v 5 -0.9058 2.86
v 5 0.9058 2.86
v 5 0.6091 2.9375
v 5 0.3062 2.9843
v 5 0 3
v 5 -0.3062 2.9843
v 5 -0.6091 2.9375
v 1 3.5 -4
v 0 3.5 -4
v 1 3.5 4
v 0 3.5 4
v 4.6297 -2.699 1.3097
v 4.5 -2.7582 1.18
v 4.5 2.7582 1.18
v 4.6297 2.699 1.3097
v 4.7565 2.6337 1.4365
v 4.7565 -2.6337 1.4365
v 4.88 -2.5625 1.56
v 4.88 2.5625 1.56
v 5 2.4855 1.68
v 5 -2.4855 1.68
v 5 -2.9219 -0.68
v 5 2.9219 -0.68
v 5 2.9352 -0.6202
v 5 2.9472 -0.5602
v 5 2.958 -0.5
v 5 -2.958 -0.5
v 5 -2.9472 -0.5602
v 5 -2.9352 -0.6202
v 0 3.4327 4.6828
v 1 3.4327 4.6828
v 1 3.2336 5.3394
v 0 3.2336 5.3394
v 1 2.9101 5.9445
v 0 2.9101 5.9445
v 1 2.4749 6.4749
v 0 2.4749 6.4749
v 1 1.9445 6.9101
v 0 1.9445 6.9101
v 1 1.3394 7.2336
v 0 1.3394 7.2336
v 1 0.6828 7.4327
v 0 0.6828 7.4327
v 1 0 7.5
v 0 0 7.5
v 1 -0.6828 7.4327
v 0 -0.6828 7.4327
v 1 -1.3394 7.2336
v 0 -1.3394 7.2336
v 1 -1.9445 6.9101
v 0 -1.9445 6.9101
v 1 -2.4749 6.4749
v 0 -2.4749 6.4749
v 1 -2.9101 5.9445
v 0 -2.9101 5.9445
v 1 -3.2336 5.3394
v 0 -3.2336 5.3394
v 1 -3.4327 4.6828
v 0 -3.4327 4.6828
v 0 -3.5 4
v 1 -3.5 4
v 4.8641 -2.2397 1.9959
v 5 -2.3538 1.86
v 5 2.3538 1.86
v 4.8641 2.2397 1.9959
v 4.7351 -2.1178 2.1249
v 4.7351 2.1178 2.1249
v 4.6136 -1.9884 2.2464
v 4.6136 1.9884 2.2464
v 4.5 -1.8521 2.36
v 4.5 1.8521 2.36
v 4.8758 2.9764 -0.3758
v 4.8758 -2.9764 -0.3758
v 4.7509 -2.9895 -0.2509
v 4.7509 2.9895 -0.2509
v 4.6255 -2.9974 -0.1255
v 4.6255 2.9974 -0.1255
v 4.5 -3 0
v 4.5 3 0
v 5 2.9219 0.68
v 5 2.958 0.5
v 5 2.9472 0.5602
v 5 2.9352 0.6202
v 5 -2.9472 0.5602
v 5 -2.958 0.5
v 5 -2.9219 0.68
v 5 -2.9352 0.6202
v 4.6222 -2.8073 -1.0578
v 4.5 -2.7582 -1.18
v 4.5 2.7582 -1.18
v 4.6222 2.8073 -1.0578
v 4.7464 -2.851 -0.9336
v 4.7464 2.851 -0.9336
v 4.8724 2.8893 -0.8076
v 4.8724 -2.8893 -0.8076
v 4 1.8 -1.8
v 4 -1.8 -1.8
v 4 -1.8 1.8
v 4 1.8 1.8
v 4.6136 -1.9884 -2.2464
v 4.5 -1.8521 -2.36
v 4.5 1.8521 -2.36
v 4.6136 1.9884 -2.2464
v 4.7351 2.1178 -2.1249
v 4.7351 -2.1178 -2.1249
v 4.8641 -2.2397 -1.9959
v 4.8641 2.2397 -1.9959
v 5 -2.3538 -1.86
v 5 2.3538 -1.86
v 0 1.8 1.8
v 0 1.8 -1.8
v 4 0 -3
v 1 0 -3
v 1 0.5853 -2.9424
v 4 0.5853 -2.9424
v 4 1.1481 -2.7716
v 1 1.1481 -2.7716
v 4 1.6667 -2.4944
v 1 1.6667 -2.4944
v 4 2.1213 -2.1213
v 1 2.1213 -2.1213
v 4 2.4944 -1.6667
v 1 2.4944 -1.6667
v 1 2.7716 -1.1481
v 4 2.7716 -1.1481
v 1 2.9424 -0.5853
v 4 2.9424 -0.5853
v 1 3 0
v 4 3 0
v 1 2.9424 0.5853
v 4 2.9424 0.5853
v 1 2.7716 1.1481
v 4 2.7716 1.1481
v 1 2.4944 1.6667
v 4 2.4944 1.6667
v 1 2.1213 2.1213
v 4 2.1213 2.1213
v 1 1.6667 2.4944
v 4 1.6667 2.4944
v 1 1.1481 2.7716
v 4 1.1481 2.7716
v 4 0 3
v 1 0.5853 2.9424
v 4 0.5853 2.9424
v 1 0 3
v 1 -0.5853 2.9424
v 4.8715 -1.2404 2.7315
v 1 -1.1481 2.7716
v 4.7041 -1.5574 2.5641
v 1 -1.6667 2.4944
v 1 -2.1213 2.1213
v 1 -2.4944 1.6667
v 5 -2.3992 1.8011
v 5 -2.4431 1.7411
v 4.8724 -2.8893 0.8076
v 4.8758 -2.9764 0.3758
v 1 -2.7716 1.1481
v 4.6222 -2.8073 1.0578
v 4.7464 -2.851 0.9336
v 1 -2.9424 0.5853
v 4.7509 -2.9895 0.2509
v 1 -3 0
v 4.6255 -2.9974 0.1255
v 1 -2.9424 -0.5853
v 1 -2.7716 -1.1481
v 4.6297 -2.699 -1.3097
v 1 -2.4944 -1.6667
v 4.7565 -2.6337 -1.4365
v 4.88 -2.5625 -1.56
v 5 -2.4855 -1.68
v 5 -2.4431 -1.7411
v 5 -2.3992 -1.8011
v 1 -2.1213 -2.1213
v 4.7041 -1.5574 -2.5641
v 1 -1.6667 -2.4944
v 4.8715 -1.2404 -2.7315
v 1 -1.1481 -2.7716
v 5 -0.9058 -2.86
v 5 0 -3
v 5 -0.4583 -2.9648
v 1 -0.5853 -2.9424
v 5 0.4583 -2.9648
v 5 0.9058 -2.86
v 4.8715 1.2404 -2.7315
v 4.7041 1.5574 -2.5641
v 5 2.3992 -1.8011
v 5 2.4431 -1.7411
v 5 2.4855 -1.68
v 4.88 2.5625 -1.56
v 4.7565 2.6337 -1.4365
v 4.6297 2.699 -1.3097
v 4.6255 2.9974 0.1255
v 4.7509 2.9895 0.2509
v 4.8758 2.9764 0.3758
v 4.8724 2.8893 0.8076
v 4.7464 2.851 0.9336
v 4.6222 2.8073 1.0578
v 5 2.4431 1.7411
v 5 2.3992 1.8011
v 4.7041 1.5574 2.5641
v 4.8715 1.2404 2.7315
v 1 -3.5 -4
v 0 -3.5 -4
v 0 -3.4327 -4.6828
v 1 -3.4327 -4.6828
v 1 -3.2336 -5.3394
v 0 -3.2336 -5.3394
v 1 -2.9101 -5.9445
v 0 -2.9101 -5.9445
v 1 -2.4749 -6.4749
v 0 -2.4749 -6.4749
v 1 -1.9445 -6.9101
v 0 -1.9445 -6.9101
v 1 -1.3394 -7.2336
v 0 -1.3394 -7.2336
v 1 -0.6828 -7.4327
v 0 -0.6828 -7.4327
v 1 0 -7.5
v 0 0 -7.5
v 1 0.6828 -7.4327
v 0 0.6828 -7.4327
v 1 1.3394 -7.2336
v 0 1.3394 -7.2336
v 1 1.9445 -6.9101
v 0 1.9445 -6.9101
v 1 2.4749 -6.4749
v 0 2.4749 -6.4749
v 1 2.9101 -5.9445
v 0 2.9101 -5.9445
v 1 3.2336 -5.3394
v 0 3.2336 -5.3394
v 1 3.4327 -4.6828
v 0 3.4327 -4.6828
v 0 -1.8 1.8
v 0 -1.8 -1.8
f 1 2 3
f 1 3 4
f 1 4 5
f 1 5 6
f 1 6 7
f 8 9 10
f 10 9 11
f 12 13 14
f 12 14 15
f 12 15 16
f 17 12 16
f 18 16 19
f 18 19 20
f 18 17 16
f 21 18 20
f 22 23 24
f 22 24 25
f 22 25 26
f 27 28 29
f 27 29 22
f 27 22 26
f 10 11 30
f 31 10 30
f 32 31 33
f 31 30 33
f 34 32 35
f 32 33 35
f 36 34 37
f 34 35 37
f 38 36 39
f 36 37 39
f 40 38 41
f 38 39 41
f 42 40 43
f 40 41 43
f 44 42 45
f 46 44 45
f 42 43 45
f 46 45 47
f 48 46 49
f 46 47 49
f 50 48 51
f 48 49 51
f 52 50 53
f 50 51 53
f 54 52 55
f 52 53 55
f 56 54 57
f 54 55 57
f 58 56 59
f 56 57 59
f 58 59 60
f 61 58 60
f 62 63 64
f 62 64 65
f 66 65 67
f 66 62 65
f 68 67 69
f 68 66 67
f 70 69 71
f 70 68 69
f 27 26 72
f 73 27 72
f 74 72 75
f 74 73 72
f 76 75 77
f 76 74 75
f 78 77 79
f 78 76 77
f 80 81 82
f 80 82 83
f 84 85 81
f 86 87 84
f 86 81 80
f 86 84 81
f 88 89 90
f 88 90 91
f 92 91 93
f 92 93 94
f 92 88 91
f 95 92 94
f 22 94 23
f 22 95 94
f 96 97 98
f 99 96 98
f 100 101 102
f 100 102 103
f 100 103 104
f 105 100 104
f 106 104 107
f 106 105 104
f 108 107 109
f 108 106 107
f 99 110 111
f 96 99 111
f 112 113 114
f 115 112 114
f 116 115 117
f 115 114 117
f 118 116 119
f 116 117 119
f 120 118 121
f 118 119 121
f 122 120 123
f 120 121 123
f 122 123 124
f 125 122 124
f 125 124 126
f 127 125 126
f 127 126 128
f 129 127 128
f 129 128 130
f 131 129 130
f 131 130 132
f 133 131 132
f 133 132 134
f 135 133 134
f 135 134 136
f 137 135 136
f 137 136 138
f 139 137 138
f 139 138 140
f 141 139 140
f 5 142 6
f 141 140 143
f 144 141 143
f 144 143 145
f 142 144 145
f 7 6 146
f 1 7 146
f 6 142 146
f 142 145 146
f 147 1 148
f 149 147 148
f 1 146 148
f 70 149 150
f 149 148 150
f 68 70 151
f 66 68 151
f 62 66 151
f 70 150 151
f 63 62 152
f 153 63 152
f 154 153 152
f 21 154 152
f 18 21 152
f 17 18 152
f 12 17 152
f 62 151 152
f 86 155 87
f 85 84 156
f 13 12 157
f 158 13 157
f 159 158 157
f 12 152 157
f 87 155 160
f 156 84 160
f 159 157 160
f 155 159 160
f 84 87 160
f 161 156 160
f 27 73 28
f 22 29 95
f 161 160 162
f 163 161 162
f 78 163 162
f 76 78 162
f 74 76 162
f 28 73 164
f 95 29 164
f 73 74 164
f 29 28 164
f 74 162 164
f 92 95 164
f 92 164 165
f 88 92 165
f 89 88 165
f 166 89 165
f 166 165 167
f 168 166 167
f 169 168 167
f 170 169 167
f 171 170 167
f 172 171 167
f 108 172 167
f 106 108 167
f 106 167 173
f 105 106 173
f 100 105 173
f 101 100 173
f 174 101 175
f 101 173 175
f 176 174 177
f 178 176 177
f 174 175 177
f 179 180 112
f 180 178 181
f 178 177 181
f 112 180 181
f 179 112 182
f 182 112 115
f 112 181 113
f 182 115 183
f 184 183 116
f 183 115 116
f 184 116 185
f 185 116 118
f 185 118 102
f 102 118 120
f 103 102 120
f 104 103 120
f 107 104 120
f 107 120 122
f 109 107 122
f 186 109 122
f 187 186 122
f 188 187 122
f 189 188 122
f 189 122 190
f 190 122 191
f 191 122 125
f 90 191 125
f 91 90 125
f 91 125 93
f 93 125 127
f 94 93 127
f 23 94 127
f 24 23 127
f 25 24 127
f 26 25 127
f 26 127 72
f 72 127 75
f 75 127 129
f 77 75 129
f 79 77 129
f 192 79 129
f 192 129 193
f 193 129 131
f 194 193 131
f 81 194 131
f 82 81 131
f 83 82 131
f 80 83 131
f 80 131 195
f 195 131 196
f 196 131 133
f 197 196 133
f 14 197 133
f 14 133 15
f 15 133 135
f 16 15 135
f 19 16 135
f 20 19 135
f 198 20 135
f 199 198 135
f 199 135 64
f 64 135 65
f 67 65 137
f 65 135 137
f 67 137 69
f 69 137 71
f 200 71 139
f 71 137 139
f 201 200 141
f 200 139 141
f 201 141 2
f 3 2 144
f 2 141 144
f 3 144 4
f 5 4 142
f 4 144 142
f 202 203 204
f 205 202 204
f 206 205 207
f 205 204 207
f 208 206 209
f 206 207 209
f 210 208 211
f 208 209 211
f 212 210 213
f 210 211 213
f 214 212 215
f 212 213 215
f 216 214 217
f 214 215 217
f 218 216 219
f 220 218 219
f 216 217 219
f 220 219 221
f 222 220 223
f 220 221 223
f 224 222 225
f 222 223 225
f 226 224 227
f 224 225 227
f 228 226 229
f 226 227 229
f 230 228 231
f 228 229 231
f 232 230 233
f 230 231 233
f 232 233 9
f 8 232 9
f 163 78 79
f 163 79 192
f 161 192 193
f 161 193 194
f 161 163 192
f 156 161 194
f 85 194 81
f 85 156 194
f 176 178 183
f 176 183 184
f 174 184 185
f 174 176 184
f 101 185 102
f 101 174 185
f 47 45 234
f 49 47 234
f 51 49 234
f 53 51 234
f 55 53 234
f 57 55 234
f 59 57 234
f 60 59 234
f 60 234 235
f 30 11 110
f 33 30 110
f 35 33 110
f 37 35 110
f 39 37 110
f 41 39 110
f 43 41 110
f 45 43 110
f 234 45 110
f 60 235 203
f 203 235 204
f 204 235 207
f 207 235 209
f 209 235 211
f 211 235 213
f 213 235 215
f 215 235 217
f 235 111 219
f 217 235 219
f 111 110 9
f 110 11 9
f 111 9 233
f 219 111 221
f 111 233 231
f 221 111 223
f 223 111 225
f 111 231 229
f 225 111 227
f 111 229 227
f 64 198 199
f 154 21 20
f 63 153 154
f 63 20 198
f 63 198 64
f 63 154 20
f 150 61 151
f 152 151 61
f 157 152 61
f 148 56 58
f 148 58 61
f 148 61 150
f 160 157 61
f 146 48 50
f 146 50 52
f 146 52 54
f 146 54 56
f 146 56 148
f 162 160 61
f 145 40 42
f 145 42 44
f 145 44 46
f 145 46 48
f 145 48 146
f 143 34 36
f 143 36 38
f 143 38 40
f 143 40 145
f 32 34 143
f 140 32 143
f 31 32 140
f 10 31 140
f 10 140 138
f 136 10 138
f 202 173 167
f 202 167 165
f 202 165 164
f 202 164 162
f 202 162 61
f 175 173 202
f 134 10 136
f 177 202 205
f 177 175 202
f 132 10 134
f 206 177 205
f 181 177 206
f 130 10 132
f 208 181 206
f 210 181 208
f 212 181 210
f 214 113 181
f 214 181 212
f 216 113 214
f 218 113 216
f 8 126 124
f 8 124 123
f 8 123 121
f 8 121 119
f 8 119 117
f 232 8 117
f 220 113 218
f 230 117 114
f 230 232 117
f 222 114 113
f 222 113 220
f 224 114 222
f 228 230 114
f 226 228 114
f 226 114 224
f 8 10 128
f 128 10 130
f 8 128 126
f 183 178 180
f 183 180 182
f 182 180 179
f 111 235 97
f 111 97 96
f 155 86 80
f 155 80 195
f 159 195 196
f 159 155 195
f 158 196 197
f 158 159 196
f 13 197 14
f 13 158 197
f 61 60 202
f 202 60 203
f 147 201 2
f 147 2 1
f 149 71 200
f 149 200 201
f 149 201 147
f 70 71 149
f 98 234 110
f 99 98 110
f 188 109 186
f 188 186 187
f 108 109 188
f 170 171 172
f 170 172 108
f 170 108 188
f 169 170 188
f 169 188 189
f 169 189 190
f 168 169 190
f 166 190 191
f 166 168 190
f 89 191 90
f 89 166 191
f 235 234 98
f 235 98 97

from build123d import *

# Parameters (mm, degrees)
SKETCH1_R               = 3
SKETCH1_W               = 3.6
SKETCH1_H               = 3.6
BOSS_EXTRUDE1_DEPTH     = 4
SKETCH2_W               = 3.6
SKETCH2_H               = 3.6
BOSS_EXTRUDE2_DEPTH     = 1
SKETCH3_R               = 3
BOSS_EXTRUDE3_DEPTH     = 1
CUT_EXTRUDE2_DEPTH      = 10.669539803
CUT_EXTRUDE2_DEPTH_BACK = 10.669539803


with BuildPart() as part:
    # Sketch1 → Boss-Extrude1 (new body)
    with BuildSketch(Plane(origin=(0, 0, 0), x_dir=(0, 0, -1), z_dir=(1, 0, 0))):
        Circle(SKETCH1_R)
        Rectangle(SKETCH1_W, SKETCH1_H, mode=Mode.SUBTRACT)
    extrude(amount=BOSS_EXTRUDE1_DEPTH)

    # Sketch2 → Boss-Extrude2 (add)
    with BuildSketch(Plane.ZY):
        with BuildLine():
            Line((-4, 3.5), (4, 3.5))
            ThreePointArc((4, 3.5), (7.5, 0), (4, -3.5))
            Line((4, -3.5), (-4, -3.5))
            ThreePointArc((-4, -3.5), (-7.5, 0), (-4, 3.5))
        make_face()
        Rectangle(SKETCH2_W, SKETCH2_H, mode=Mode.SUBTRACT)
    extrude(amount=-BOSS_EXTRUDE2_DEPTH)

    # Sketch3 → Boss-Extrude3 (add)
    with BuildSketch(Plane(origin=(4, 0, 0), x_dir=(0, 0, -1), z_dir=(1, 0, 0))):
        with Locations(Location((0, 0, 0), (0, 0, 180))):
            Circle(SKETCH3_R)
    extrude(amount=BOSS_EXTRUDE3_DEPTH)

    # Sketch5 → Cut-Extrude2 (cut, two sides: drawn at the far end of the back side and taken through both)
    with BuildSketch(Plane(origin=(0, 0, 0), x_dir=(1, 0, 0), z_dir=(0, 1, 0)).offset(-CUT_EXTRUDE2_DEPTH_BACK)):
        Polygon((5, 2.86), (4.5, 2.36), (5, 1.86), align=None)
        Polygon((5, 1.68), (4.5, 1.18), (5, 0.68), align=None)
        Polygon((5, 0.5), (4.5, 0), (5, -0.5), align=None)
        Polygon((5, -0.68), (4.5, -1.18), (5, -1.68), align=None)
        Polygon((5, -1.86), (4.5, -2.36), (5, -2.86), align=None)
    extrude(amount=CUT_EXTRUDE2_DEPTH + CUT_EXTRUDE2_DEPTH_BACK, mode=Mode.SUBTRACT)


solid = part.part
